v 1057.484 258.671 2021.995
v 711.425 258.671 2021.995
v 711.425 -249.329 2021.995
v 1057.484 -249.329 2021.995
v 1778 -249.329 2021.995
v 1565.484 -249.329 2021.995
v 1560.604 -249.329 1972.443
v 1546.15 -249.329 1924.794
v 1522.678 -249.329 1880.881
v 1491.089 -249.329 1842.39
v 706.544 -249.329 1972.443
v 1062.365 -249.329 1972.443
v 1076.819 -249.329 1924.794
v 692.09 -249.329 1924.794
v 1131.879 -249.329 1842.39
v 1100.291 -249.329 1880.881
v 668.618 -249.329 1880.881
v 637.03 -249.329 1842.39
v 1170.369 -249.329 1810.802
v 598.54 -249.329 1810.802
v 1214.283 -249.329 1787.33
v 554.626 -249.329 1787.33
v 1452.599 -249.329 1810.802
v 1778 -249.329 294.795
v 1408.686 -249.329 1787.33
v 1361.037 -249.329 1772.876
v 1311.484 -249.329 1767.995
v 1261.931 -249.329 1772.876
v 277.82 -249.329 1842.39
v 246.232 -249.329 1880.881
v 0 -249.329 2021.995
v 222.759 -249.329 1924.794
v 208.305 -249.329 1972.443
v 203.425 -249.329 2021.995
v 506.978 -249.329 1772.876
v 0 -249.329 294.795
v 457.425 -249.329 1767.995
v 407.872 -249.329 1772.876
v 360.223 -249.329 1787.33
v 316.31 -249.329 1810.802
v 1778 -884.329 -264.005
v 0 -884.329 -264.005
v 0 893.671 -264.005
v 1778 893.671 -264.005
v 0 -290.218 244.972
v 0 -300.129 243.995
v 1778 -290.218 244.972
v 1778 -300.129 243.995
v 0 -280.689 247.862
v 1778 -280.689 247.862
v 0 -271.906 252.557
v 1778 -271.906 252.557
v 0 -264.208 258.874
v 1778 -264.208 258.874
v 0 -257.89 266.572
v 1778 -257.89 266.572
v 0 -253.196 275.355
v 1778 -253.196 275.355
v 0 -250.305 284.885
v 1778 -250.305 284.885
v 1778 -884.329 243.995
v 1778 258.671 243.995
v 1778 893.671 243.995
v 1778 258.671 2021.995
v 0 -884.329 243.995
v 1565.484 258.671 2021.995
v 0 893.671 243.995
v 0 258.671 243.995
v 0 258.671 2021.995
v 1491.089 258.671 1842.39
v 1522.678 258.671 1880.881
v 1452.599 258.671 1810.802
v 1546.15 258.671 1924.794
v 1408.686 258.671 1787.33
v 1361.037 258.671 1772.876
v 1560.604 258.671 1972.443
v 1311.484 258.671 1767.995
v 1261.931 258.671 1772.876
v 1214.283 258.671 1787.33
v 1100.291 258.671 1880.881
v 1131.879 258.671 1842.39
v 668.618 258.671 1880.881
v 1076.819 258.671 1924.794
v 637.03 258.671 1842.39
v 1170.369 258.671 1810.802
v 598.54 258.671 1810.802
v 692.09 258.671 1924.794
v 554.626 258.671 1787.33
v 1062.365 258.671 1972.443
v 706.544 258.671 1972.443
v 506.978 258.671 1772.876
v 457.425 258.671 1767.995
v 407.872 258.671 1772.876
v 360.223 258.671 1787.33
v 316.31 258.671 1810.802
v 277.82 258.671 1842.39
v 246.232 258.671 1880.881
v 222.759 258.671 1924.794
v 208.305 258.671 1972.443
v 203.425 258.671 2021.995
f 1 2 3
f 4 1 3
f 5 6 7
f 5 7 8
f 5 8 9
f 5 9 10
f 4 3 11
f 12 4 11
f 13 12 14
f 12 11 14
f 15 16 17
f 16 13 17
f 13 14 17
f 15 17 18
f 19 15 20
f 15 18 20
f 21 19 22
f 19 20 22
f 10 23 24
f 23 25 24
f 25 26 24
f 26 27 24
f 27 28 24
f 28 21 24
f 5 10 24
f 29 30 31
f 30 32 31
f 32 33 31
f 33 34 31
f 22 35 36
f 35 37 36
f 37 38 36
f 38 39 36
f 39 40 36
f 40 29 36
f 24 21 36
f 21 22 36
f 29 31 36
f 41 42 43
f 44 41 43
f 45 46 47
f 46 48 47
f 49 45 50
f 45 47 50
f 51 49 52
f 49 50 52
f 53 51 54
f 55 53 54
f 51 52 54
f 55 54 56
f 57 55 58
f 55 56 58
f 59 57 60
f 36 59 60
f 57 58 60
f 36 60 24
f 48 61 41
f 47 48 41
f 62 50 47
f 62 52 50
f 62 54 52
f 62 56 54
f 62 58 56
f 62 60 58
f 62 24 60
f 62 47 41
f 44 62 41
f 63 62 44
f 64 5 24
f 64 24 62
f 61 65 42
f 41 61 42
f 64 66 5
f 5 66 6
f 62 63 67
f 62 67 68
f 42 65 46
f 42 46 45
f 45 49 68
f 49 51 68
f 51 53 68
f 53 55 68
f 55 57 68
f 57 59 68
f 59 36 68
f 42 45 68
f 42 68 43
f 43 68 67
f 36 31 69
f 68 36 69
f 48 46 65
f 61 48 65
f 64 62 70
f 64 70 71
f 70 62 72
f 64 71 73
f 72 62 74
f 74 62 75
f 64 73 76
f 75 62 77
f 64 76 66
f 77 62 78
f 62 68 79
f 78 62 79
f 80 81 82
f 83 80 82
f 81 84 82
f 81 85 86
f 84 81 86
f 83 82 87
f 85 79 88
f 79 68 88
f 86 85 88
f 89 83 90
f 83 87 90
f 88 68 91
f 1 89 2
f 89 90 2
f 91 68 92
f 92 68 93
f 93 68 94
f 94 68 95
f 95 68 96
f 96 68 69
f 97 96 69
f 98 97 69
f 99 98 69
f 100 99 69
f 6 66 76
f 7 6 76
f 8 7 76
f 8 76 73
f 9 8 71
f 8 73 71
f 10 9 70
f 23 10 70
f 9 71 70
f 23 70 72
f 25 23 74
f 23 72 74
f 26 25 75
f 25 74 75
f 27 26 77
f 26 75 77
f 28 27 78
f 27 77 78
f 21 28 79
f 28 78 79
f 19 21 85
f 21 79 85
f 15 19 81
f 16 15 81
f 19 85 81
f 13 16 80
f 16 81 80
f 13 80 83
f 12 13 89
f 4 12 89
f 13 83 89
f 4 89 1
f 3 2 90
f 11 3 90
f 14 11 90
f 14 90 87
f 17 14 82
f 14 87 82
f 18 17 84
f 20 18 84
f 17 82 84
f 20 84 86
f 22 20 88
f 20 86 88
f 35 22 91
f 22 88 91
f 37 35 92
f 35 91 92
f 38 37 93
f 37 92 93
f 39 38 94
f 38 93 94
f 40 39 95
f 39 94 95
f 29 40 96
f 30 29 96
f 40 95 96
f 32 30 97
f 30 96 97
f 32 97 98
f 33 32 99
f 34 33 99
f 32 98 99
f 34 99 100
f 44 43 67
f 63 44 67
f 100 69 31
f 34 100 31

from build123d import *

# Parameters (mm, degrees)
F1_DEPTH = 1778
F3_DEPTH = 508
F4_R     = 50.8


with BuildPart() as f1:
    # F0 (on Right) → F1 (new body)
    with BuildSketch(Plane.YZ):
        Polygon((-884.329032, 243.99545), (-884.329032, -264.00455), (893.670968, -264.00455), (893.670968, 243.99545), (258.670968, 243.99545), (258.670968, 2021.99545), (-249.329032, 2021.99545), (-249.329032, 243.99545), align=None)
    extrude(amount=F1_DEPTH)

    # F2 (on face) → F3 (cut, through all)
    with BuildSketch(Plane(origin=(0, 258.670968, 0), x_dir=(-1, 0, 0), z_dir=(0, 1, 0))):
        with BuildLine():
            Line((-1057.484337, 2021.99545), (-1565.484337, 2021.99545))
            ThreePointArc((-1565.484337, 2021.99545), (-1311.484337, 1767.99545), (-1057.484337, 2021.99545))
        make_face()
        with BuildLine():
            Line((-203.42479, 2021.99545), (-711.42479, 2021.99545))
            ThreePointArc((-711.42479, 2021.99545), (-457.42479, 1767.99545), (-203.42479, 2021.99545))
        make_face()
    extrude(amount=-F3_DEPTH, mode=Mode.SUBTRACT)

    # F4
    f4_edges = [f1.edges().sort_by_distance(p)[0] for p in [
        (889, -249.329032, 243.99545),
    ]]
    fillet(f4_edges, radius=F4_R)


solid = f1.part
